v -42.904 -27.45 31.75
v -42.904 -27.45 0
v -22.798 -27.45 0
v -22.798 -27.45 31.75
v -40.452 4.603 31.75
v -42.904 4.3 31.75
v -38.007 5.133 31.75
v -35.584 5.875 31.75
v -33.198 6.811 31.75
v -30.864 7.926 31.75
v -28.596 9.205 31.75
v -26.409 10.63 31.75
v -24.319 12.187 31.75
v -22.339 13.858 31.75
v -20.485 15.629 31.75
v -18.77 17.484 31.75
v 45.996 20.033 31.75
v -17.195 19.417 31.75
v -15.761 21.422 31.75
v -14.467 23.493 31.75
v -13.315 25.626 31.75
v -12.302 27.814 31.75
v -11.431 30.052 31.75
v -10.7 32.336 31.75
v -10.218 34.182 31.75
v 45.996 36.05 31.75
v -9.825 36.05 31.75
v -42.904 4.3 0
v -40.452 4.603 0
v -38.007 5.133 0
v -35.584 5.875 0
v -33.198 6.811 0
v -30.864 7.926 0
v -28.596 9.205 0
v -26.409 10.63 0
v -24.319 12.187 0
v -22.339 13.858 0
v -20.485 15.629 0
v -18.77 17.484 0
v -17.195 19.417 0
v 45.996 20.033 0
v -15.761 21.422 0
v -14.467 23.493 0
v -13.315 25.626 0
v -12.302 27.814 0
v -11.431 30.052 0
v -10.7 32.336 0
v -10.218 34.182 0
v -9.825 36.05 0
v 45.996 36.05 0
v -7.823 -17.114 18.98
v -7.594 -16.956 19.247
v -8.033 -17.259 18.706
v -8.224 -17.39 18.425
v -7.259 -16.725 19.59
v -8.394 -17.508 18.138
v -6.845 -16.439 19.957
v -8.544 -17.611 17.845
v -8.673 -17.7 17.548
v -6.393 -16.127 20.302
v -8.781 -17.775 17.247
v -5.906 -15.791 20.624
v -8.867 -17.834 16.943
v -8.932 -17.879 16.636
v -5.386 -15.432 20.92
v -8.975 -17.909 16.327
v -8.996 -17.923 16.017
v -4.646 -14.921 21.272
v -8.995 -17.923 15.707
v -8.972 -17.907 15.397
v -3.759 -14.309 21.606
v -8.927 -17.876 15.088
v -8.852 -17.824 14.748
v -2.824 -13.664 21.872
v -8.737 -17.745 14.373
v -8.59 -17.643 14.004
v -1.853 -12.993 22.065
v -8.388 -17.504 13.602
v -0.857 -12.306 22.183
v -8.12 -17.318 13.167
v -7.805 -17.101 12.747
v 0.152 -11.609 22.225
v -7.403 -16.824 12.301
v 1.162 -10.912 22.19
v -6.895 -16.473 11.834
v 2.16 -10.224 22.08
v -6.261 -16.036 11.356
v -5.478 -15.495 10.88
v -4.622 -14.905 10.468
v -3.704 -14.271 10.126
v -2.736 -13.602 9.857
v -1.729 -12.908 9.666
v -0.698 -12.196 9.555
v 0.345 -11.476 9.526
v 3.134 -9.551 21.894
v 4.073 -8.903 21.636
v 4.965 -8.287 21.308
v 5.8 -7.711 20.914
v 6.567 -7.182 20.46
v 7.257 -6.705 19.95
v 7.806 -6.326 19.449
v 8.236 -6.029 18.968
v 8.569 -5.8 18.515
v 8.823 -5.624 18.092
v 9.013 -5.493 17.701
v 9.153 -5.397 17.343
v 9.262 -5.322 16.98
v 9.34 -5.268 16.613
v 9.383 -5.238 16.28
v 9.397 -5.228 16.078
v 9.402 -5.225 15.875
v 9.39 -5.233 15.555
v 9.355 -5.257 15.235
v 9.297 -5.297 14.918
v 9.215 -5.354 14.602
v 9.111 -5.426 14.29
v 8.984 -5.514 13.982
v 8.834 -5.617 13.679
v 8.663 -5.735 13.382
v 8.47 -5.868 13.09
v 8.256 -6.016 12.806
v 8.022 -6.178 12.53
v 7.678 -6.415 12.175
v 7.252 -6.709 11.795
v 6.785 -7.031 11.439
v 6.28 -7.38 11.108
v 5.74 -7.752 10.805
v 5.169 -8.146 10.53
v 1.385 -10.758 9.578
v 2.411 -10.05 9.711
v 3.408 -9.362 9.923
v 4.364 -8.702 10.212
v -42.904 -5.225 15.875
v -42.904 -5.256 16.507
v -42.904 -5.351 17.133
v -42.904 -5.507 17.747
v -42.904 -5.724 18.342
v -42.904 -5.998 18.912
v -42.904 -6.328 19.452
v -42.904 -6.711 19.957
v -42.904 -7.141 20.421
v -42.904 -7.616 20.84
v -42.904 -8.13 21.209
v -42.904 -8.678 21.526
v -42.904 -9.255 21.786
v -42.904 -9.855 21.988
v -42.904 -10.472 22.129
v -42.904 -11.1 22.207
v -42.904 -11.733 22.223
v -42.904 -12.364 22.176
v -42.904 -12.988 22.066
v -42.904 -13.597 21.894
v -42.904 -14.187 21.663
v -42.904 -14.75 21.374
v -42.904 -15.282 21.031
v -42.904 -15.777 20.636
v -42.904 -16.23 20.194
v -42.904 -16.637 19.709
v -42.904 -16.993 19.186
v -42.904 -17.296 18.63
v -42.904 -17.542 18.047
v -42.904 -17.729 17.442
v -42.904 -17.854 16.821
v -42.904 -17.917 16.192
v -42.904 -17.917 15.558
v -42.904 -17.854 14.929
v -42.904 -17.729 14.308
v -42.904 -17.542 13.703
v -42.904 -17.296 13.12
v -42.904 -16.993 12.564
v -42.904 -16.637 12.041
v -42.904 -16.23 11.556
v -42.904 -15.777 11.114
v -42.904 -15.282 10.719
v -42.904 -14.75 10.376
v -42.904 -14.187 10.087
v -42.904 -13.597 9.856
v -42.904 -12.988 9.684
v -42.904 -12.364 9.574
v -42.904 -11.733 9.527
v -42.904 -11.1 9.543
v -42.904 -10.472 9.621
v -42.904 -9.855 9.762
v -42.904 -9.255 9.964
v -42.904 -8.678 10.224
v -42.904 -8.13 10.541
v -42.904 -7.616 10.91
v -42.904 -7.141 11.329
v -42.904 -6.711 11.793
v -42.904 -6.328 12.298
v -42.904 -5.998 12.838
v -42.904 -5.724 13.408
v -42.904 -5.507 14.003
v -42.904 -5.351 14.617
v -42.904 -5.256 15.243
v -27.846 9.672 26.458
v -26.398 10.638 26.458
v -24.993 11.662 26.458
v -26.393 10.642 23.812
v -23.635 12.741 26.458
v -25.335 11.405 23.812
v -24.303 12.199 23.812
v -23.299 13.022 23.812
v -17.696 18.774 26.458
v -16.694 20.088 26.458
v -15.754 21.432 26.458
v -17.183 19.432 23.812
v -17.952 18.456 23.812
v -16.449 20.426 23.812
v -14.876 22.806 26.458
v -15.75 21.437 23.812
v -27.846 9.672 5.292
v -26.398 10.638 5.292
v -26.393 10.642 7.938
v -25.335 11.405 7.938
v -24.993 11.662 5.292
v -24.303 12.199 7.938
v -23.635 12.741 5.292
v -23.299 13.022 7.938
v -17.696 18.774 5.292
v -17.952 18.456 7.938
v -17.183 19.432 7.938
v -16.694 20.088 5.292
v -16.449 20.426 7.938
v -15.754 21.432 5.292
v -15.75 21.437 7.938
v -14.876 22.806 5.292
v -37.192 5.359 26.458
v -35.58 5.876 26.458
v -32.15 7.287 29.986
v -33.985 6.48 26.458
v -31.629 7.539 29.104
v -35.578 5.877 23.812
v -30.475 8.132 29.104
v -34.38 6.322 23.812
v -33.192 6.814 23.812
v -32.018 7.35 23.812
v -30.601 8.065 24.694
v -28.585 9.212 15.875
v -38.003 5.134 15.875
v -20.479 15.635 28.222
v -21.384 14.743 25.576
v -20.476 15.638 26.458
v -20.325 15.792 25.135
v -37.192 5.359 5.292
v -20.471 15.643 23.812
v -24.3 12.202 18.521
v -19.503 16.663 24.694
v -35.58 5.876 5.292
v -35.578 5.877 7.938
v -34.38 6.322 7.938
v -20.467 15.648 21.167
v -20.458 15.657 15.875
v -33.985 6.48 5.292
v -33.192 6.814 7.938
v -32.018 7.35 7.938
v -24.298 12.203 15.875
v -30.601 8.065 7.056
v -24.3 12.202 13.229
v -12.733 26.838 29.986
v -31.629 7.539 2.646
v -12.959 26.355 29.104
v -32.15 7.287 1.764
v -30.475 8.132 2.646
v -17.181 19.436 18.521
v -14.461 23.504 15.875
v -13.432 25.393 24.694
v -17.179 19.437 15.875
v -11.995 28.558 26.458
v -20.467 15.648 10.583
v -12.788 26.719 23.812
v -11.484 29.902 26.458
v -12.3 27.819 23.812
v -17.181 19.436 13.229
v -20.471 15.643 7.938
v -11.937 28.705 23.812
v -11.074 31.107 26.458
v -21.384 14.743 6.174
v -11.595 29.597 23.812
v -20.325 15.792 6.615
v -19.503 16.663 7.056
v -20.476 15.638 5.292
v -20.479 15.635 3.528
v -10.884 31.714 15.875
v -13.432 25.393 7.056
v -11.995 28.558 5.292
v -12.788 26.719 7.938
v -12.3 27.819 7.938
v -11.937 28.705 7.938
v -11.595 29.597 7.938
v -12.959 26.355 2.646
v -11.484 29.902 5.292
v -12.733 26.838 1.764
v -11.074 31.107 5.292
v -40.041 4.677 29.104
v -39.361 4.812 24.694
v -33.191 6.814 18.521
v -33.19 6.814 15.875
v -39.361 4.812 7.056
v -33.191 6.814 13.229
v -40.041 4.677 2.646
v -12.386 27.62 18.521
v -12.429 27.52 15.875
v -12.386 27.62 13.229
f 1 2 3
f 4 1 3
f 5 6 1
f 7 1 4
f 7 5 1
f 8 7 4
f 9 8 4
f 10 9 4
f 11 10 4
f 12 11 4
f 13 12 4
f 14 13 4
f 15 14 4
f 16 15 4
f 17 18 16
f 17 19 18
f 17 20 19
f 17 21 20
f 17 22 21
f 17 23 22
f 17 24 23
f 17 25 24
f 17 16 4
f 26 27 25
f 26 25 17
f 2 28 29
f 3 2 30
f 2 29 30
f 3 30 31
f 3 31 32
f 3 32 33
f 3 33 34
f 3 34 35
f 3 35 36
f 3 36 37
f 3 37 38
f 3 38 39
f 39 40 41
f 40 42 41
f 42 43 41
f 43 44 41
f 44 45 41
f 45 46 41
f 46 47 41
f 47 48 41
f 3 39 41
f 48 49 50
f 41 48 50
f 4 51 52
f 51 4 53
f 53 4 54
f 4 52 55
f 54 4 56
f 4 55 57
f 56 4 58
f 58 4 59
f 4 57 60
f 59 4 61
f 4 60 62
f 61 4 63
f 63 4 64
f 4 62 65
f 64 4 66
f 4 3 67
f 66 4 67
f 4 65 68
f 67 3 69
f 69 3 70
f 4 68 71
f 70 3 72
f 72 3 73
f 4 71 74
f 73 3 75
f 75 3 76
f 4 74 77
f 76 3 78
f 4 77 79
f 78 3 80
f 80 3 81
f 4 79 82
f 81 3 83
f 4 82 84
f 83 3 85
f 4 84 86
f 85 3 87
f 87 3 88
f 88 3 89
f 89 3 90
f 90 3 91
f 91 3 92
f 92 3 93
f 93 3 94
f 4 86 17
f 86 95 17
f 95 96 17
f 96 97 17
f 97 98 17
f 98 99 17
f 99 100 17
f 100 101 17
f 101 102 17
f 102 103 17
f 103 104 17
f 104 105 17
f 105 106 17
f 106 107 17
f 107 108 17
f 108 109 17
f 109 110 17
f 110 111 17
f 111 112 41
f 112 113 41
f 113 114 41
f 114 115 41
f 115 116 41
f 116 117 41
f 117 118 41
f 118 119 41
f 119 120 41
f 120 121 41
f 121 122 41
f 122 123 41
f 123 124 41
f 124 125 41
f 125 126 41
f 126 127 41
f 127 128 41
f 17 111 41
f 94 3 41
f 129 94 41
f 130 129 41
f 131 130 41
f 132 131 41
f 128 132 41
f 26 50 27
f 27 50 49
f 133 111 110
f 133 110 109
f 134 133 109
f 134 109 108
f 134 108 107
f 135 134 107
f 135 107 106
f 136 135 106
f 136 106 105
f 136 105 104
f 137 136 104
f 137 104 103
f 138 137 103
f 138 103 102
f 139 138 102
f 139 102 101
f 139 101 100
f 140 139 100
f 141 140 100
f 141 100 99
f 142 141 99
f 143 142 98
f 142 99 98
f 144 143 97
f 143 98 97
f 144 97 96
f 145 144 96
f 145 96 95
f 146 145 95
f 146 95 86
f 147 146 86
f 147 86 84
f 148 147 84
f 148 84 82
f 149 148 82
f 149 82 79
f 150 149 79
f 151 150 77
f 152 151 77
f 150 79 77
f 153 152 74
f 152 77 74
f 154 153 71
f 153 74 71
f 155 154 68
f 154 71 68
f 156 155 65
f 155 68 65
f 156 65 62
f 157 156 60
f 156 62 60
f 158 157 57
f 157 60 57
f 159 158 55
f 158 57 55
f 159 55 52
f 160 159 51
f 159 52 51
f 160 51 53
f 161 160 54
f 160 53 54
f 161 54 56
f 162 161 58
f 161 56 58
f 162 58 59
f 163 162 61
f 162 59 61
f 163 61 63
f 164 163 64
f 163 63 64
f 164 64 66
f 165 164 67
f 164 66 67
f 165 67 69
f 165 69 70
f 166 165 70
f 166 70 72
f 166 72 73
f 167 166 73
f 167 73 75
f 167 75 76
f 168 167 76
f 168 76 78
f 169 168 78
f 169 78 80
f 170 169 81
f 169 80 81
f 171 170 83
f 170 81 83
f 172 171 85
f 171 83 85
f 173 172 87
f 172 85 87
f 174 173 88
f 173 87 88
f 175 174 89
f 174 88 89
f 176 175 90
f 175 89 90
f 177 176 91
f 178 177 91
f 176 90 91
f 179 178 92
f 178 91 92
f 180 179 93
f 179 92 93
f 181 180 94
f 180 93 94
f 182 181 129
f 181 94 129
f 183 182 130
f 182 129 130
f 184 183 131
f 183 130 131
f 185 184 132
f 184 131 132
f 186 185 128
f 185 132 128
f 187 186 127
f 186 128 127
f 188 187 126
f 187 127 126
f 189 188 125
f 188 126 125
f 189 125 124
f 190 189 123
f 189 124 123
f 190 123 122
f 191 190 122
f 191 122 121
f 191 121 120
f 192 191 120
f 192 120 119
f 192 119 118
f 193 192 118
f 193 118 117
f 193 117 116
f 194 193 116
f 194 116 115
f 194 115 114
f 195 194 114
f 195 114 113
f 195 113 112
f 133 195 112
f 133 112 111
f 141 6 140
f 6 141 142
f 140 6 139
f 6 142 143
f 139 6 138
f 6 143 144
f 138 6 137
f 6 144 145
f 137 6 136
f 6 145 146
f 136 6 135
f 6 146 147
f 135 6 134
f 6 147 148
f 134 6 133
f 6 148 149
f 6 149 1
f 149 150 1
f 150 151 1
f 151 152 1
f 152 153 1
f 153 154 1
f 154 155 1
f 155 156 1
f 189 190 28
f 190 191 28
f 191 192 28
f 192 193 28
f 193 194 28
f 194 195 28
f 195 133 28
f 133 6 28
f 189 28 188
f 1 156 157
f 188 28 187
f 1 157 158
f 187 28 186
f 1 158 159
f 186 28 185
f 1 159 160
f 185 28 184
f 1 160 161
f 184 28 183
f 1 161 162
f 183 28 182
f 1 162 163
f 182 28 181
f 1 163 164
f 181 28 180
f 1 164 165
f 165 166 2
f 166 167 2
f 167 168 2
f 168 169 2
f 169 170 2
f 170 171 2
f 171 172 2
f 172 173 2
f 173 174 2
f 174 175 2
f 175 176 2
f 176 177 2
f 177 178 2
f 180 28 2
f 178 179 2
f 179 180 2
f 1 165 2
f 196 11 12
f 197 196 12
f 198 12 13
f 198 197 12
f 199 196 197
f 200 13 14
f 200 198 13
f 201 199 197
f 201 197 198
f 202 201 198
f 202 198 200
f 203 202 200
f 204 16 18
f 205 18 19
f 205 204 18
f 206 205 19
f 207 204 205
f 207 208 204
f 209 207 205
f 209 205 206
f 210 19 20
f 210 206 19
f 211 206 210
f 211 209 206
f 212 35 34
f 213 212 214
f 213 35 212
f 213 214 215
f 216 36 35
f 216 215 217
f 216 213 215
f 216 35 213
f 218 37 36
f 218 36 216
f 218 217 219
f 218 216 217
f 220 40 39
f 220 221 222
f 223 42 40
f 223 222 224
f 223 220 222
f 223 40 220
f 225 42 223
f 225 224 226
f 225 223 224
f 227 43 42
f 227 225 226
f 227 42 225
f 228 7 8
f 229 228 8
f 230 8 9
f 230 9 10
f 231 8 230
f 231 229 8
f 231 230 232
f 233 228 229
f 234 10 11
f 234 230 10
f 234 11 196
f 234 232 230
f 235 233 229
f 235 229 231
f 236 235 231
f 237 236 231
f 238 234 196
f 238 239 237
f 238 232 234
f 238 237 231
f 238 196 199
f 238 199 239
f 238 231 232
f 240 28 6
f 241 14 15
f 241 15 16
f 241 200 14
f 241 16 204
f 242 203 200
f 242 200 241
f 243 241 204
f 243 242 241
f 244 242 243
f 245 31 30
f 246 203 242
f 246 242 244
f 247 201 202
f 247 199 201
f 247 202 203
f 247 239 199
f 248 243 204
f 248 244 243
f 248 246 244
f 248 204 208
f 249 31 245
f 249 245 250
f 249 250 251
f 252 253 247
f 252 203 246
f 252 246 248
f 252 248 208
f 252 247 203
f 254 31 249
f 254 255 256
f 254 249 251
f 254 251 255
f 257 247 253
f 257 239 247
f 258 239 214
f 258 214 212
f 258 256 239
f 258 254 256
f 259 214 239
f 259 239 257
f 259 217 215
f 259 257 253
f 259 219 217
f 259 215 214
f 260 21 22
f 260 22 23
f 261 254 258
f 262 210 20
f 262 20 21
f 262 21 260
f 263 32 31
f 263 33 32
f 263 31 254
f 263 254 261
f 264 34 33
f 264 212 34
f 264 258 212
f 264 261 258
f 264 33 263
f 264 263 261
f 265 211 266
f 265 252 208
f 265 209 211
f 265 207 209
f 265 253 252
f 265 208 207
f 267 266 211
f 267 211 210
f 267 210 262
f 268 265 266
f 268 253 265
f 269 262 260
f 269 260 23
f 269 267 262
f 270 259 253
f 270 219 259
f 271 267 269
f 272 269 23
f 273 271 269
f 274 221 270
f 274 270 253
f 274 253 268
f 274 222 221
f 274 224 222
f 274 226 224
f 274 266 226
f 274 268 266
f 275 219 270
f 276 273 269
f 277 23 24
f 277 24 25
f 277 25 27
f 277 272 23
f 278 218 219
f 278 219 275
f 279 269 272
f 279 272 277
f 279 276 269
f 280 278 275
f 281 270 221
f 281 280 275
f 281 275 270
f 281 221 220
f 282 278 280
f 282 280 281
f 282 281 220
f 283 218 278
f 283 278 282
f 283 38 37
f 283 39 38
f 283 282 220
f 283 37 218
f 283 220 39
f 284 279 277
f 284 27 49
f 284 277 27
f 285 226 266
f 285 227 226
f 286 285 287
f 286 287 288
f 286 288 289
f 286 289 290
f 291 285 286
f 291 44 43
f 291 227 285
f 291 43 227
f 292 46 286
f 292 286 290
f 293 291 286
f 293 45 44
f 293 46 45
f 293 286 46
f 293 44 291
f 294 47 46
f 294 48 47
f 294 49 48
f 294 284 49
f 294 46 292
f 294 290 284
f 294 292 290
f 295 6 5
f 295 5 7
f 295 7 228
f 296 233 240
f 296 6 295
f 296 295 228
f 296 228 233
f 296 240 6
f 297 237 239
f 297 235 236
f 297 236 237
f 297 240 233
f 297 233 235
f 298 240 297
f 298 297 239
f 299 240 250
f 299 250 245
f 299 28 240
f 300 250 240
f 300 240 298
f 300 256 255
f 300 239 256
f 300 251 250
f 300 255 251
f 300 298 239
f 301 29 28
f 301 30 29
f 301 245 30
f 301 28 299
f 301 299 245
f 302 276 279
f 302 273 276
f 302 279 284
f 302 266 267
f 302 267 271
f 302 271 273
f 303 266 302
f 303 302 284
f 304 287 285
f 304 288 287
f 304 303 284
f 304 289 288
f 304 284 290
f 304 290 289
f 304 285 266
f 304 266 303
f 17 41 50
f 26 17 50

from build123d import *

# Parameters (mm, degrees)
F1_DEPTH = 31.75
F3_D     = 12.7


with BuildPart() as f1:
    # F0 (on Top) → F1 (new body)
    with BuildSketch(Plane.XY):
        with BuildLine():
            Line((45.9964759648, 36.0500998795), (-9.8253758624, 36.0500998795))
            add(Edge.make_bspline(
                [(-42.9035240352, 4.3000998795), (-34.7231067307, 4.914947889), (-18.4671684559, 14.0682512449), (-11.2220877593, 28.5159185869), (-9.8253758624, 36.0500998795)],
                knots=[0, 0, 0, 0, 0.5112036525, 1, 1, 1, 1], degree=3))
            Line((-42.9035240352, 4.3000998795), (-42.9035240352, -27.4499001205))
            Line((-42.9035240352, -27.4499001205), (-22.798109327, -27.4499001205))
            Line((-22.798109327, -27.4499001205), (45.9964759648, 20.0334768742))
            Line((45.9964759648, 20.0334768742), (45.9964759648, 36.0500998795))
        make_face()
    extrude(amount=F1_DEPTH)

    # F3 (through all)
    with Locations(Plane(origin=(-42.9035240352, 0, 0), x_dir=(0, -1, 0), z_dir=(-1, 0, 0))):
        with Locations((11.5749001205, 15.875)):
            Hole(F3_D / 2)


solid = f1.part
